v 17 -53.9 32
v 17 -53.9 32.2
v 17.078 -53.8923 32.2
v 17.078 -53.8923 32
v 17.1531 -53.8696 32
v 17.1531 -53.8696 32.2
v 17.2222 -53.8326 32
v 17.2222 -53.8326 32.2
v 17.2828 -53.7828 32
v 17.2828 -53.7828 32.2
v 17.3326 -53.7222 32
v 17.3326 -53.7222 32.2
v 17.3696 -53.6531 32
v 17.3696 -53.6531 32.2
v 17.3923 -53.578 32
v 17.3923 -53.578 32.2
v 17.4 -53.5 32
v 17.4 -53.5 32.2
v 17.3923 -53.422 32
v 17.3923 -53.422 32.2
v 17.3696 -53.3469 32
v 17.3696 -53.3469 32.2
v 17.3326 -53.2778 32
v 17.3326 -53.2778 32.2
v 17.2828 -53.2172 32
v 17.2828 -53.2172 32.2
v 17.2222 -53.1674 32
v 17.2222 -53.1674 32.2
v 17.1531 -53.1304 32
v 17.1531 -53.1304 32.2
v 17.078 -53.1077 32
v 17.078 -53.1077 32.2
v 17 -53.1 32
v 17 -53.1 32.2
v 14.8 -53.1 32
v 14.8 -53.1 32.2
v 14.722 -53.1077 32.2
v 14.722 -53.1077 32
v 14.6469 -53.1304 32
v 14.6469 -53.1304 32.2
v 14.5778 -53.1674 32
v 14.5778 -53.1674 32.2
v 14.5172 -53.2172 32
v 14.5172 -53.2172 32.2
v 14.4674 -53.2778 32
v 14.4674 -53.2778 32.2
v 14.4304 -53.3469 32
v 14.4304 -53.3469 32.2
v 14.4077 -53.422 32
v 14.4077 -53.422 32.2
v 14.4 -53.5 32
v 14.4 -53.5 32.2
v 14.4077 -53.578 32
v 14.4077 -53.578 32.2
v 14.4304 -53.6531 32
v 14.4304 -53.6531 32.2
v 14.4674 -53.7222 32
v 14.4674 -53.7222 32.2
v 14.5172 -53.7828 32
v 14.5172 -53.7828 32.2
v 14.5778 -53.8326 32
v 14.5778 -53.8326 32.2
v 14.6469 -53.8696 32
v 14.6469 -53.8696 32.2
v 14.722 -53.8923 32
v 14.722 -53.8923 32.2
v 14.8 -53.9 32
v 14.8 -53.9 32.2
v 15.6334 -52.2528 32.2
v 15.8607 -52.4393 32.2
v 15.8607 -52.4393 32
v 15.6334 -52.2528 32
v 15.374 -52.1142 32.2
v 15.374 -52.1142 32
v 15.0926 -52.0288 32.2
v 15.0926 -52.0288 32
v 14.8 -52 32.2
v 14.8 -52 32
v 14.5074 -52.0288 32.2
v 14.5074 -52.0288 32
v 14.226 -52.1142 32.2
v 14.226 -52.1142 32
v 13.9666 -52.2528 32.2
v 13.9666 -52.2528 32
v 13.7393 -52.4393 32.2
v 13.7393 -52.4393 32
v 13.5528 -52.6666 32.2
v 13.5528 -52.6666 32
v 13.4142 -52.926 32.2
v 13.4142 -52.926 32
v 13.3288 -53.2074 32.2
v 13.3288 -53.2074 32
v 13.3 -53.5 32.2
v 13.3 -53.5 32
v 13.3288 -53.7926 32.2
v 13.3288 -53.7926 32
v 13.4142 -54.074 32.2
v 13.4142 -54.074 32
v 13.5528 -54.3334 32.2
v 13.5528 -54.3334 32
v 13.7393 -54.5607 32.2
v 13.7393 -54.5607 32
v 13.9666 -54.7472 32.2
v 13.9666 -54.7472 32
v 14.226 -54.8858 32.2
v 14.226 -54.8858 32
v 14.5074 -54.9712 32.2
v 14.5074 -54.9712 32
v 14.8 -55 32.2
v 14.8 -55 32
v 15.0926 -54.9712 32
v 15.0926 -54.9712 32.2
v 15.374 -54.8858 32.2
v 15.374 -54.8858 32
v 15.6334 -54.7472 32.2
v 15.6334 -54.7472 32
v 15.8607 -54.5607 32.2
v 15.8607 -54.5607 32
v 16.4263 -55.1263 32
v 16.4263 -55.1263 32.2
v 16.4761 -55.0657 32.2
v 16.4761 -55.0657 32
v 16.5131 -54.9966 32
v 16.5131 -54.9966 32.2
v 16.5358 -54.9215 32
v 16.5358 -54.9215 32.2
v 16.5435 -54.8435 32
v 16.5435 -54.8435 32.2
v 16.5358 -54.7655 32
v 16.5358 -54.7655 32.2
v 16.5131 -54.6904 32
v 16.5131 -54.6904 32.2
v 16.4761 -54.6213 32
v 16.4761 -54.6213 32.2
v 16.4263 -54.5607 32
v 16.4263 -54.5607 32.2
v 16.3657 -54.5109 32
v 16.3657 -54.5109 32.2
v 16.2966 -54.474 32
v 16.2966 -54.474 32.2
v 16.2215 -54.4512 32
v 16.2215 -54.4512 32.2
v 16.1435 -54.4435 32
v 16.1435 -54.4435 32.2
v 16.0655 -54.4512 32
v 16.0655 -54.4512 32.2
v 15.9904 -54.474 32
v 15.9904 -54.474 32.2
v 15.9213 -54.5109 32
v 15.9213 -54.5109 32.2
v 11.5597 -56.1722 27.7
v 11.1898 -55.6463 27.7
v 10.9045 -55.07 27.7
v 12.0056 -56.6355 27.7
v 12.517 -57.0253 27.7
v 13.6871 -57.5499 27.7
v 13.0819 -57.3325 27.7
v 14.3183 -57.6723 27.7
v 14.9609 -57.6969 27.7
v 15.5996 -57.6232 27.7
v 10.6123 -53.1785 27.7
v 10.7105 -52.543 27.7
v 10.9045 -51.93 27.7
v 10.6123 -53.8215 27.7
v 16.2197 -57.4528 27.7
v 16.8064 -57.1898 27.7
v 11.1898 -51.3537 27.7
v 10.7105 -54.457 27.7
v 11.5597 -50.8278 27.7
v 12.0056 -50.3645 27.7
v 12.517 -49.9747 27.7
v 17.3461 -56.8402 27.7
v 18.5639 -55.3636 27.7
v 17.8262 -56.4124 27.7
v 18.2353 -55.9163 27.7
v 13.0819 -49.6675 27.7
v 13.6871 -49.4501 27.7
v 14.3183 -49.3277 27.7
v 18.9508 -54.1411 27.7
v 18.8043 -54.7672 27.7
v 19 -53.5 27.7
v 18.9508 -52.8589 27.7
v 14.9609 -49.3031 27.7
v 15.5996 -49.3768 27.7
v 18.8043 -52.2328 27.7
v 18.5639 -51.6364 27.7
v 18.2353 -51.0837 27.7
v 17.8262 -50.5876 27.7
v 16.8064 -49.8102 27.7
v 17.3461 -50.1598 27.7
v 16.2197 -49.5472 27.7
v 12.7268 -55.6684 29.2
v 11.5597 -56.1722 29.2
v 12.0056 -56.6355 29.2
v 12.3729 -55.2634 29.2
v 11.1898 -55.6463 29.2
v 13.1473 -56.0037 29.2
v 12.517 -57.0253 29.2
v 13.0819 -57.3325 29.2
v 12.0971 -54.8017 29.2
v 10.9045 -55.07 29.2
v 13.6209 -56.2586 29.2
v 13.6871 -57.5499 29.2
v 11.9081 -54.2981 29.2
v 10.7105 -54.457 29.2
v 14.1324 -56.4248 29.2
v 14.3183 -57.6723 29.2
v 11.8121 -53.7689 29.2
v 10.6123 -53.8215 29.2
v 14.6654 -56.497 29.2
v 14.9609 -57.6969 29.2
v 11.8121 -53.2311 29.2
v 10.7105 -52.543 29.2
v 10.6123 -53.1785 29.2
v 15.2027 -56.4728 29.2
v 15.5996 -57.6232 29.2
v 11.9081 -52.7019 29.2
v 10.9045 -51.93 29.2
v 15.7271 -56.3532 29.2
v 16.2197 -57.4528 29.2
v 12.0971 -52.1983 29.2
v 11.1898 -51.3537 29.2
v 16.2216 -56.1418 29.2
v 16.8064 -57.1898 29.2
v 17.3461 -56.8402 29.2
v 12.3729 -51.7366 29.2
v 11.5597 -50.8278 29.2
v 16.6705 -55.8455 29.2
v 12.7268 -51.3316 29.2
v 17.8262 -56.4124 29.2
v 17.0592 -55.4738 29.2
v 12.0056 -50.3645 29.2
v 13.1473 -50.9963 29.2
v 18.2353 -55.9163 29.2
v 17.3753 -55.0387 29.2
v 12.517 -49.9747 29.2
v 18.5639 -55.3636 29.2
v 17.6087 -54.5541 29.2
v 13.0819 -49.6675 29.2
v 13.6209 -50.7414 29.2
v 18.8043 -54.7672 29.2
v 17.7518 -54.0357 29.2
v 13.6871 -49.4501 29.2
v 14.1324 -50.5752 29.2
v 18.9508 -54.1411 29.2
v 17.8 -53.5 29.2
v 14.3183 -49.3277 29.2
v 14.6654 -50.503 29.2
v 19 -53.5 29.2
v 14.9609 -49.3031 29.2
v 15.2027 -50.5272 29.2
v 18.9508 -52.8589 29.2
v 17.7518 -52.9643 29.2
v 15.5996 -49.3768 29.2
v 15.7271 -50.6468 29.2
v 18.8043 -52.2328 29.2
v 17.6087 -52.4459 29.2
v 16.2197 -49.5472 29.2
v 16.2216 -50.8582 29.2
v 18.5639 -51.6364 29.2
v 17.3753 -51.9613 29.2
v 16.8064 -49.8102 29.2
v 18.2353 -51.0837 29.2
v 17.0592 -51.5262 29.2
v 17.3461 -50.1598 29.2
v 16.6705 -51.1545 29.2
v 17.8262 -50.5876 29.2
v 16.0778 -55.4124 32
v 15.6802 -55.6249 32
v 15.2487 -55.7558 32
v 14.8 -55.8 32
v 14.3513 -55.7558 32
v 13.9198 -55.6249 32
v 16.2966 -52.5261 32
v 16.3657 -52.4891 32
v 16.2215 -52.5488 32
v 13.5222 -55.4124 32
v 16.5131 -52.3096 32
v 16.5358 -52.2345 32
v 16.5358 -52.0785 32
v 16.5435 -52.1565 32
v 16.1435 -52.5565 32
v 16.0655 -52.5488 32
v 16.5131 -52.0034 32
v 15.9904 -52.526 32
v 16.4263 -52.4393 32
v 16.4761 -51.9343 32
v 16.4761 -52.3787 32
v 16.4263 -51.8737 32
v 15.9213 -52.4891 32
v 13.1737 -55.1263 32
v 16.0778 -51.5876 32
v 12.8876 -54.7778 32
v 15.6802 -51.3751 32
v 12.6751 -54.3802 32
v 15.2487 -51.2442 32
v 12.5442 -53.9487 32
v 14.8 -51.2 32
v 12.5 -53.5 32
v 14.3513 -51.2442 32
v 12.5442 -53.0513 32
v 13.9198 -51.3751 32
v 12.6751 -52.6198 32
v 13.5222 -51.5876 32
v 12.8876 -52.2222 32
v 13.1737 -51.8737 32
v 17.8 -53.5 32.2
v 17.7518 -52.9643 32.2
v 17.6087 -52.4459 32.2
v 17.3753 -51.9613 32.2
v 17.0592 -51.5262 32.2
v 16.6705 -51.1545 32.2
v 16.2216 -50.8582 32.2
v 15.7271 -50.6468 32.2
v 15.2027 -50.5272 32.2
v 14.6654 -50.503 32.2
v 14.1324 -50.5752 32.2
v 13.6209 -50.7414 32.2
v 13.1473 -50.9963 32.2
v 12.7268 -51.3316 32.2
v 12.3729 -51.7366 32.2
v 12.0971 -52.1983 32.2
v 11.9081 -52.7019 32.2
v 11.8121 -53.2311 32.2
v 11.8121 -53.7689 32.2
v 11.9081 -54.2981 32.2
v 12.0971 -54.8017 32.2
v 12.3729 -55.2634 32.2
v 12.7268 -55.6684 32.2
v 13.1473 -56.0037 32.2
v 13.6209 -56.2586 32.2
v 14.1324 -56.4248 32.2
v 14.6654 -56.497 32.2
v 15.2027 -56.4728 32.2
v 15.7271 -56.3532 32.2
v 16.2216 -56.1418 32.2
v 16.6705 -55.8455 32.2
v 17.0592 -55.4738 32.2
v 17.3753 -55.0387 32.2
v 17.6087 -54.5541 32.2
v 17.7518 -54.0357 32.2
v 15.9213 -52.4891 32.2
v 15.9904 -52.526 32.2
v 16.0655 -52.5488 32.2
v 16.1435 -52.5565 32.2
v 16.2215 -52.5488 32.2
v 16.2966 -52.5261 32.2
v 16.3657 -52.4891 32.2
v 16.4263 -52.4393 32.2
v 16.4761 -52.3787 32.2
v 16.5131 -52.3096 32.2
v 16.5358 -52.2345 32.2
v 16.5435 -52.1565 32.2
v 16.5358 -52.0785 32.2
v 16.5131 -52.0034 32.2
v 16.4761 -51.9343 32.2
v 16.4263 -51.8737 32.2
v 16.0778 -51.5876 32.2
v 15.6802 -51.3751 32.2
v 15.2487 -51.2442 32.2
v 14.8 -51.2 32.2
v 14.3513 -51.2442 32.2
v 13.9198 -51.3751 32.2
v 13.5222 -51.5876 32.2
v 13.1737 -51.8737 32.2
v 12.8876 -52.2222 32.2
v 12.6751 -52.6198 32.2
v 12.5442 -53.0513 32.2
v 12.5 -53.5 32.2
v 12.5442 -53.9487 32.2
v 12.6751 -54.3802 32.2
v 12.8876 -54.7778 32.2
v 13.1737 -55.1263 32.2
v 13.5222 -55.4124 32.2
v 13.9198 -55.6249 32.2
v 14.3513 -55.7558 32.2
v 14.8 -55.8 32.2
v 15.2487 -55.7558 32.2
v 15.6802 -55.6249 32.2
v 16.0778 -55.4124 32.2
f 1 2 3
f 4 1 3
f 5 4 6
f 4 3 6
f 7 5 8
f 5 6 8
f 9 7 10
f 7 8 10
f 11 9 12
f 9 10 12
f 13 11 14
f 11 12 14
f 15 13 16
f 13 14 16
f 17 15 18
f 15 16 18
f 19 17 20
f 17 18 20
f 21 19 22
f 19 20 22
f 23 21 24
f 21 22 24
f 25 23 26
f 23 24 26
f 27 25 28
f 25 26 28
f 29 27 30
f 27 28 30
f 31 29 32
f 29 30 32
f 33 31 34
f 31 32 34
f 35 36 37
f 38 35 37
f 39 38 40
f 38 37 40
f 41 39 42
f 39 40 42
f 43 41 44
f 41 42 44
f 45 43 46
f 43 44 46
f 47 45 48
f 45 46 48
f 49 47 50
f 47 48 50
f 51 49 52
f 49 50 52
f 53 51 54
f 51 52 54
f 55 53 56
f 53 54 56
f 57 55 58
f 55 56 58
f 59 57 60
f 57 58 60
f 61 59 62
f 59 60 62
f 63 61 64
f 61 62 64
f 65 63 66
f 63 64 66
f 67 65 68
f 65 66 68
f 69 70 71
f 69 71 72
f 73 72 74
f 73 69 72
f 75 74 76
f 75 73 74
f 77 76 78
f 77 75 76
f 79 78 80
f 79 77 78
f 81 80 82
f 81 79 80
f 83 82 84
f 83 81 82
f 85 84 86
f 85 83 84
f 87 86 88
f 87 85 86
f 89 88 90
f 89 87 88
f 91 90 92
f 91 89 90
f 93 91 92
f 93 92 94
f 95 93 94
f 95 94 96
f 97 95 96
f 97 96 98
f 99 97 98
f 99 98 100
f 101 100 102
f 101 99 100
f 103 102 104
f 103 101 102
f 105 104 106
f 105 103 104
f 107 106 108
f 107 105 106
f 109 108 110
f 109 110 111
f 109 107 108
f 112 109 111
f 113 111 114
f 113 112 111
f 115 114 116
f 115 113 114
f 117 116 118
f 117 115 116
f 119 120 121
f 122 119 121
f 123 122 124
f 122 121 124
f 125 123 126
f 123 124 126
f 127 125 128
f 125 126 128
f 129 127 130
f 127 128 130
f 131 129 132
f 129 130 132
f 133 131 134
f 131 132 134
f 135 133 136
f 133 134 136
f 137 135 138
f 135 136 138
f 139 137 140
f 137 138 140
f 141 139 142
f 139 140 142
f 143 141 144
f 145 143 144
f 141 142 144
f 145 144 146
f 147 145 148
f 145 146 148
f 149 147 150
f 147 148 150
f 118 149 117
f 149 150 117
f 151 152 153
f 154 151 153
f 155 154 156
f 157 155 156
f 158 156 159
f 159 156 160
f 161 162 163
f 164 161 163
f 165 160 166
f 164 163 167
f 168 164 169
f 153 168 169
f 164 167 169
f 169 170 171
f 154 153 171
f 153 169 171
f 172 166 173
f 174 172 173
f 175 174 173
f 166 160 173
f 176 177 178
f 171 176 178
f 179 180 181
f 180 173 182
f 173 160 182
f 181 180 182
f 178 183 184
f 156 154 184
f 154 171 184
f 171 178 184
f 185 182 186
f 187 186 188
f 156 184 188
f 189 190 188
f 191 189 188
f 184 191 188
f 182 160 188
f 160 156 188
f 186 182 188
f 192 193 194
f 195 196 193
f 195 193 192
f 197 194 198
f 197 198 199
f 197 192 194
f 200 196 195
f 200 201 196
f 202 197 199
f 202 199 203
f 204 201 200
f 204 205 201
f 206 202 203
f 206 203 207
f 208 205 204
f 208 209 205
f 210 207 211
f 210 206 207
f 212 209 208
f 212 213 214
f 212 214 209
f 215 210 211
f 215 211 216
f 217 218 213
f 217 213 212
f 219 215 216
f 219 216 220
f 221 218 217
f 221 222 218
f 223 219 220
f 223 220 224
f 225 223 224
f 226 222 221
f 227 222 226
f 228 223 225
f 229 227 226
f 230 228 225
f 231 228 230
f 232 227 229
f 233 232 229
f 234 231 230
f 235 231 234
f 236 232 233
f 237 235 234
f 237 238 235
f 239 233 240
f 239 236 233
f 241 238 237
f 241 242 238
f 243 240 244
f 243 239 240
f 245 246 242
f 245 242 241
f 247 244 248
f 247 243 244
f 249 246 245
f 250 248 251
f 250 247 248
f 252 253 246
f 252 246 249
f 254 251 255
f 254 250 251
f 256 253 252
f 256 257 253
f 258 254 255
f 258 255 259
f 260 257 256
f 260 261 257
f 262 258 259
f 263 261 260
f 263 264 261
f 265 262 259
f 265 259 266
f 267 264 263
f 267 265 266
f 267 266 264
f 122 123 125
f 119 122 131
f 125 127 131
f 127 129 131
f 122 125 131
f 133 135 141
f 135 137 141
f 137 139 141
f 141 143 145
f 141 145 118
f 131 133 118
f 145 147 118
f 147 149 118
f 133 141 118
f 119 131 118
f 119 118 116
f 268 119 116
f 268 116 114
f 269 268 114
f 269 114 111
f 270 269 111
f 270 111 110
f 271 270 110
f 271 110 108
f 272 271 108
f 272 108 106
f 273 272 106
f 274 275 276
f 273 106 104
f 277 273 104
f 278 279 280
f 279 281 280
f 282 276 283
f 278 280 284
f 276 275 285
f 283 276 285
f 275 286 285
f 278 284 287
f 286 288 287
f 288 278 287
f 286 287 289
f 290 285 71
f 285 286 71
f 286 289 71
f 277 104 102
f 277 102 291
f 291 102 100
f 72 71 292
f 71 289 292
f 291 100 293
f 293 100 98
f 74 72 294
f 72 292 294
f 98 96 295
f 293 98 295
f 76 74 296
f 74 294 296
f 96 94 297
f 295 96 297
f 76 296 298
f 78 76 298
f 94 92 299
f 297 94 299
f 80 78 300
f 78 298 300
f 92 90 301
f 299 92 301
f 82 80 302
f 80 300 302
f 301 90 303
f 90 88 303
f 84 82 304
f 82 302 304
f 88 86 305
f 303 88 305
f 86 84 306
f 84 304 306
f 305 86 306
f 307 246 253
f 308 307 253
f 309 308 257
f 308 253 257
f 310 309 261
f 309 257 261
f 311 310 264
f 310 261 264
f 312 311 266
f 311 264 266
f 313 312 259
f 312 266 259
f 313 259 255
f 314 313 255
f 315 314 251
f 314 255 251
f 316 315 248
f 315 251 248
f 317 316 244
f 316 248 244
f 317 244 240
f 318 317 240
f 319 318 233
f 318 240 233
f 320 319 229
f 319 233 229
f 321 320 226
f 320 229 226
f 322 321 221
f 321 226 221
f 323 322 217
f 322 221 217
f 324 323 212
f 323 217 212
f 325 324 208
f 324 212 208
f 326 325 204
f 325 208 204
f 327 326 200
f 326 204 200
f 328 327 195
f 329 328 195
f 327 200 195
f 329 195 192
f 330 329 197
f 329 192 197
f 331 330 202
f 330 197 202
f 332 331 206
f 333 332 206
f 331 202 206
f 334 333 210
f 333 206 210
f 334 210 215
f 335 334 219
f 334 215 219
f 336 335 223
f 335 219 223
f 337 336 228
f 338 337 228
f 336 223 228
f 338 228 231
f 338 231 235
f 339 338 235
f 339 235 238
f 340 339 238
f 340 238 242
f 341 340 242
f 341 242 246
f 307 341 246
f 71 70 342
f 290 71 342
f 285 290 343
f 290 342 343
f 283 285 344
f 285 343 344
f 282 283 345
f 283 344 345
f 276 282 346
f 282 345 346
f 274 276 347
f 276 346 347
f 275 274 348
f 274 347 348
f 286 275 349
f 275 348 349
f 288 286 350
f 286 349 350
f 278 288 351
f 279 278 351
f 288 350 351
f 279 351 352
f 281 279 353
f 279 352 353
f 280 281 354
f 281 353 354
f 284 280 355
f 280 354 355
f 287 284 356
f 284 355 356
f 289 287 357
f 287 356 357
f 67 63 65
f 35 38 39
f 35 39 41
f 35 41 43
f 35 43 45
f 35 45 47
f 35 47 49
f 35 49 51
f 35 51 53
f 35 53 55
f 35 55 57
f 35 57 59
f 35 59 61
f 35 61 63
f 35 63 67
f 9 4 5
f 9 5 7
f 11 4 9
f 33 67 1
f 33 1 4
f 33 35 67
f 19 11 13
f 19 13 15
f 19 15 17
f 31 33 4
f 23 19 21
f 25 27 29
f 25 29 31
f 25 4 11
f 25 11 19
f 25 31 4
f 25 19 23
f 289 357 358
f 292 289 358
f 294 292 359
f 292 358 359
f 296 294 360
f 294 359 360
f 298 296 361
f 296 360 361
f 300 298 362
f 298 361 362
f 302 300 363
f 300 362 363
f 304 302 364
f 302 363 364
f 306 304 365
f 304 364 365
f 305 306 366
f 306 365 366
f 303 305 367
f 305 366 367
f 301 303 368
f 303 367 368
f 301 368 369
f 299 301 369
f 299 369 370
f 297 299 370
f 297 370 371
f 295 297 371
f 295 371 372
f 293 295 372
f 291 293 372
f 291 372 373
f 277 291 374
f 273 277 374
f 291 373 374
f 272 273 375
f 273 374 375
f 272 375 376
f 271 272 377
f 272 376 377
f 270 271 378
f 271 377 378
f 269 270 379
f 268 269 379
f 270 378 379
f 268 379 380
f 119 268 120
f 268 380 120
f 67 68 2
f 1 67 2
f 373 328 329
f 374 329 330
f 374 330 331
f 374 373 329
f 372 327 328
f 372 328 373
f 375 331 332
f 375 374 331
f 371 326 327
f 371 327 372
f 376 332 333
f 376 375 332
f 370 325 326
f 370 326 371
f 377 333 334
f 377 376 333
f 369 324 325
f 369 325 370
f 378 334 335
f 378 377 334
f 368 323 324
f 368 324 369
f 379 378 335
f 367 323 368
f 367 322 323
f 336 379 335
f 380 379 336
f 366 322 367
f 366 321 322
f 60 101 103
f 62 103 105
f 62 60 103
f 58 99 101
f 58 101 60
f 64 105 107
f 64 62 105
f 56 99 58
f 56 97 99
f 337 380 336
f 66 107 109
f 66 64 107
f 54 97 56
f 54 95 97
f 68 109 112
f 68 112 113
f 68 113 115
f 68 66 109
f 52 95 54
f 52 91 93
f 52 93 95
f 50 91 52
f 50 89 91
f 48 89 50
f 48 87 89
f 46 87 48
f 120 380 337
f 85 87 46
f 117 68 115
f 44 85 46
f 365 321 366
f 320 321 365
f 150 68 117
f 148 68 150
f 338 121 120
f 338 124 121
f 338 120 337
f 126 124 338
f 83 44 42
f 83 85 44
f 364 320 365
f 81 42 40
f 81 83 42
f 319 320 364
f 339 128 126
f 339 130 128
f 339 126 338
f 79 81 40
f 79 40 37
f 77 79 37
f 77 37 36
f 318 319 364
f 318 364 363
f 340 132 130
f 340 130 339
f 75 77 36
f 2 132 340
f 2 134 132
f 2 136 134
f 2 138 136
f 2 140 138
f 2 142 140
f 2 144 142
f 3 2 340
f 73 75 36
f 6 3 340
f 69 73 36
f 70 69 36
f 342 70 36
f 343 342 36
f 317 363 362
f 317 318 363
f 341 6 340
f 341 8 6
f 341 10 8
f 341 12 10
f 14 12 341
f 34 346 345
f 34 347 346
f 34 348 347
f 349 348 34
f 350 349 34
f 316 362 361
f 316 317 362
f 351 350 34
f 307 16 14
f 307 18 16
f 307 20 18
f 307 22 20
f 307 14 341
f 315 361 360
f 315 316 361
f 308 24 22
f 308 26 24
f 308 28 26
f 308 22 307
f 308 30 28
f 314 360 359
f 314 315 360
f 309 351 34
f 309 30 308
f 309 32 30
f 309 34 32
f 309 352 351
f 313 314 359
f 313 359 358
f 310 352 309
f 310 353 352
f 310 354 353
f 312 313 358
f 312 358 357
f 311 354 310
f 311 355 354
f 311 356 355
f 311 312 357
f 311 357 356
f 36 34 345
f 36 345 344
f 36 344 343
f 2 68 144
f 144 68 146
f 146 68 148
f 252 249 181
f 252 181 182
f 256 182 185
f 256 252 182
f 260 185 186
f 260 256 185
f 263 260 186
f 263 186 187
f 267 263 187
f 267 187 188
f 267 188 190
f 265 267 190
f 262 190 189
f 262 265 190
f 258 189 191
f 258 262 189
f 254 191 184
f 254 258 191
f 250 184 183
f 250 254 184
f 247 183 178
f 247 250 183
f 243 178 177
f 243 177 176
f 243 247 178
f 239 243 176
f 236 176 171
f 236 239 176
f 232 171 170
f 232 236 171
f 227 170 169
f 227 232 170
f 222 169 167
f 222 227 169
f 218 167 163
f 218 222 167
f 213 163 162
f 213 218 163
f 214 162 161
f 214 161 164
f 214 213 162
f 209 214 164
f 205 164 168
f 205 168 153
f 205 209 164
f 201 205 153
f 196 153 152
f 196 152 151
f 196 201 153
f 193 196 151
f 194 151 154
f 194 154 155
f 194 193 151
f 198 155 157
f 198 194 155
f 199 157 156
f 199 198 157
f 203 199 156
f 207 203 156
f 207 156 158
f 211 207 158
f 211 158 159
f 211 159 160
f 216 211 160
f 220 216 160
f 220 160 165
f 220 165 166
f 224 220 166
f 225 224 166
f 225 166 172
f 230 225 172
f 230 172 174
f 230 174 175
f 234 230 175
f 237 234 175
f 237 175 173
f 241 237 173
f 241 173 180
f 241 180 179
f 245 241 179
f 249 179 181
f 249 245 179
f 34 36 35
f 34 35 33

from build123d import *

# Parameters (mm, degrees)
SKETCH_R     = 4.2
PAD006_DEPTH = 1.5
SKETCH012_R  = 3
PAD007_DEPTH = 3
POCKET_DEPTH = 0.2


with BuildPart() as part:
    # Sketch → Pad006 (new body)
    with BuildSketch(Plane.XY.offset(29.2)):
        with Locations((14.8, -53.5)):
            Circle(SKETCH_R)
    extrude(amount=-PAD006_DEPTH)

    # Sketch012 (on Face2 of Pad006) → Pad007 (join)
    with BuildSketch(Plane.XY.offset(29.2)):
        with Locations((14.8, -53.5)):
            Circle(SKETCH012_R)
    extrude(amount=PAD007_DEPTH)

    # Sketch013 (on Face5 of Pad007) → Pocket (cut)
    with BuildSketch(Plane.XY.offset(32.2)):
        with BuildLine():
            ThreePointArc((15.86066, -52.43934), (13.3, -53.5), (15.86066, -54.56066))
            ThreePointArc((16.426344, -55.126347), (16.426345, -54.560662), (15.86066, -54.56066))
            ThreePointArc((16.426348, -51.873657), (12.5, -53.499997), (16.426344, -55.126347))
            ThreePointArc((15.86066, -52.43934), (16.426346, -52.439343), (16.426348, -51.873657))
        make_face()
        with BuildLine():
            ThreePointArc((14.8, -53.1), (14.4, -53.5), (14.8, -53.9))
            Line((14.8, -53.9), (17, -53.9))
            ThreePointArc((17, -53.9), (17.4, -53.5), (17, -53.1))
            Line((14.8, -53.1), (17, -53.1))
        make_face()
    extrude(amount=-POCKET_DEPTH, mode=Mode.SUBTRACT)


solid = part.part
